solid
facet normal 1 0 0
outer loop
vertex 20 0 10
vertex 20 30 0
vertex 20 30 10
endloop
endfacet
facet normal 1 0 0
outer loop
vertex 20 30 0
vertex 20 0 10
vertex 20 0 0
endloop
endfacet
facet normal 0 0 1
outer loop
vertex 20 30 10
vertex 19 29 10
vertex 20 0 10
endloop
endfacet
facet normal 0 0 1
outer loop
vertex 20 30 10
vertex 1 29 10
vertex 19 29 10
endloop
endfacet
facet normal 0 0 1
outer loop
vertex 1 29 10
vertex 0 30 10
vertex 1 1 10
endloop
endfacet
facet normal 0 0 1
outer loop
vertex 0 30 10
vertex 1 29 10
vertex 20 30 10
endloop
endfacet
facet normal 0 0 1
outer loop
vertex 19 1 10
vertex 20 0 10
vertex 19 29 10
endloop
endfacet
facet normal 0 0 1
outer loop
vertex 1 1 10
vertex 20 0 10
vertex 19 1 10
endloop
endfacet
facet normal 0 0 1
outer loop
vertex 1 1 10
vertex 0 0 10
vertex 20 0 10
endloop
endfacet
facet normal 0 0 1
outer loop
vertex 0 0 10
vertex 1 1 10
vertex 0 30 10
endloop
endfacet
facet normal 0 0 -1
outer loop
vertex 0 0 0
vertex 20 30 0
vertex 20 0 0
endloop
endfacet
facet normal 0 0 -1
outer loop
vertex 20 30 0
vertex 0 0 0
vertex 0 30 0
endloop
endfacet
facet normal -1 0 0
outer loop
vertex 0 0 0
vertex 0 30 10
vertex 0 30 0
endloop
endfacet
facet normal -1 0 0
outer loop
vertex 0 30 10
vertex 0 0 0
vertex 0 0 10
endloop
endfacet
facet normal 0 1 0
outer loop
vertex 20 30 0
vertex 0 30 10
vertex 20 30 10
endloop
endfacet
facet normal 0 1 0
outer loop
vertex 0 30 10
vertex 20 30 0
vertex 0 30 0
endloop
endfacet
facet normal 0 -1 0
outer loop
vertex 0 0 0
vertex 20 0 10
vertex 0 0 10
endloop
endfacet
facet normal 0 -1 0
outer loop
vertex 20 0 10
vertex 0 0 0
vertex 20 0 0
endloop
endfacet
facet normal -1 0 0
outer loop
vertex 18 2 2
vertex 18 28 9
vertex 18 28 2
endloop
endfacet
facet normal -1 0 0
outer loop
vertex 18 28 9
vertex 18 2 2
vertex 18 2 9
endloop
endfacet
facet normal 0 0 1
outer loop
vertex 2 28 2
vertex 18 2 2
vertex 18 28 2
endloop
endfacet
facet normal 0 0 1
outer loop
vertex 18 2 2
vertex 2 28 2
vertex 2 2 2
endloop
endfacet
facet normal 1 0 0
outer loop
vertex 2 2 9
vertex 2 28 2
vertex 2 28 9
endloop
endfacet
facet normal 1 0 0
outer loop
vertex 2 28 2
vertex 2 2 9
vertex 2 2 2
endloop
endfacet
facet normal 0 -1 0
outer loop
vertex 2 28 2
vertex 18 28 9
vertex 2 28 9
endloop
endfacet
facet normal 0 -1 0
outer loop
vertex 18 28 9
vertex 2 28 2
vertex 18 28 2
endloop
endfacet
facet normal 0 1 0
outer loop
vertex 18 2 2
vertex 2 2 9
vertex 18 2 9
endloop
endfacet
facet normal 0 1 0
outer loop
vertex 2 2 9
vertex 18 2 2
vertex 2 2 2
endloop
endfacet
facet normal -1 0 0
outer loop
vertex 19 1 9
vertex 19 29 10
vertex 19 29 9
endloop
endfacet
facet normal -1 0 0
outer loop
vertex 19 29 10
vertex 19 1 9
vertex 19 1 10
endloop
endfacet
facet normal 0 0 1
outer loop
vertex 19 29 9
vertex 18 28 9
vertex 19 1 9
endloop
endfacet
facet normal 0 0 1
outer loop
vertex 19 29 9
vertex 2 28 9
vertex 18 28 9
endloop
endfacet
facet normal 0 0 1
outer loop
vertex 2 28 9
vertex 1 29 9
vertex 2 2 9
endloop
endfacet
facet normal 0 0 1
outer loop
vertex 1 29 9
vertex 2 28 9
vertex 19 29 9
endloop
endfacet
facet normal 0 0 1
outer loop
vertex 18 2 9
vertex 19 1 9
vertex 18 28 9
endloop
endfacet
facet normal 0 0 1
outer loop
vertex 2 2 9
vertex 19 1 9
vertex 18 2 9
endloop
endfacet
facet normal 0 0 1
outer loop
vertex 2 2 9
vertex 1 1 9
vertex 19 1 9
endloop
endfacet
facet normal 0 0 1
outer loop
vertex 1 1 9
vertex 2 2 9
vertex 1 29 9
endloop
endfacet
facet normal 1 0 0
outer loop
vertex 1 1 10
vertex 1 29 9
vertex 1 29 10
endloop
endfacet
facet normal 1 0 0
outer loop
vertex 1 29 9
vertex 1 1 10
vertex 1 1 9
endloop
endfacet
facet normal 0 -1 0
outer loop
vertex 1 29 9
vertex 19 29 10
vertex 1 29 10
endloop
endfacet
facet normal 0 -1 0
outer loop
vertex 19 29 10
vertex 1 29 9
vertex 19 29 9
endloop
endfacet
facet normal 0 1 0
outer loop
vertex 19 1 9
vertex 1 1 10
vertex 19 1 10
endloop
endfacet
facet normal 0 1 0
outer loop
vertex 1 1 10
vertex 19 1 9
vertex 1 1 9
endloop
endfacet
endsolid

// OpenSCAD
// Esimerkki 1b: Yksinkertainen laatikko (z-välkyntä estetty)

box = [20, 30, 10];
wall = 2;
eps = 0.01;

difference() {
  cube(box);
  translate([wall, wall, wall]) {
    cube(box - [2*wall, 2*wall, wall-eps]);
  }
  translate([0.5*wall, 0.5*wall, box[2]-0.5*wall]) {
    cube([box[0]-wall, box[1]-wall, 0.5*wall+eps]);
  }
}
